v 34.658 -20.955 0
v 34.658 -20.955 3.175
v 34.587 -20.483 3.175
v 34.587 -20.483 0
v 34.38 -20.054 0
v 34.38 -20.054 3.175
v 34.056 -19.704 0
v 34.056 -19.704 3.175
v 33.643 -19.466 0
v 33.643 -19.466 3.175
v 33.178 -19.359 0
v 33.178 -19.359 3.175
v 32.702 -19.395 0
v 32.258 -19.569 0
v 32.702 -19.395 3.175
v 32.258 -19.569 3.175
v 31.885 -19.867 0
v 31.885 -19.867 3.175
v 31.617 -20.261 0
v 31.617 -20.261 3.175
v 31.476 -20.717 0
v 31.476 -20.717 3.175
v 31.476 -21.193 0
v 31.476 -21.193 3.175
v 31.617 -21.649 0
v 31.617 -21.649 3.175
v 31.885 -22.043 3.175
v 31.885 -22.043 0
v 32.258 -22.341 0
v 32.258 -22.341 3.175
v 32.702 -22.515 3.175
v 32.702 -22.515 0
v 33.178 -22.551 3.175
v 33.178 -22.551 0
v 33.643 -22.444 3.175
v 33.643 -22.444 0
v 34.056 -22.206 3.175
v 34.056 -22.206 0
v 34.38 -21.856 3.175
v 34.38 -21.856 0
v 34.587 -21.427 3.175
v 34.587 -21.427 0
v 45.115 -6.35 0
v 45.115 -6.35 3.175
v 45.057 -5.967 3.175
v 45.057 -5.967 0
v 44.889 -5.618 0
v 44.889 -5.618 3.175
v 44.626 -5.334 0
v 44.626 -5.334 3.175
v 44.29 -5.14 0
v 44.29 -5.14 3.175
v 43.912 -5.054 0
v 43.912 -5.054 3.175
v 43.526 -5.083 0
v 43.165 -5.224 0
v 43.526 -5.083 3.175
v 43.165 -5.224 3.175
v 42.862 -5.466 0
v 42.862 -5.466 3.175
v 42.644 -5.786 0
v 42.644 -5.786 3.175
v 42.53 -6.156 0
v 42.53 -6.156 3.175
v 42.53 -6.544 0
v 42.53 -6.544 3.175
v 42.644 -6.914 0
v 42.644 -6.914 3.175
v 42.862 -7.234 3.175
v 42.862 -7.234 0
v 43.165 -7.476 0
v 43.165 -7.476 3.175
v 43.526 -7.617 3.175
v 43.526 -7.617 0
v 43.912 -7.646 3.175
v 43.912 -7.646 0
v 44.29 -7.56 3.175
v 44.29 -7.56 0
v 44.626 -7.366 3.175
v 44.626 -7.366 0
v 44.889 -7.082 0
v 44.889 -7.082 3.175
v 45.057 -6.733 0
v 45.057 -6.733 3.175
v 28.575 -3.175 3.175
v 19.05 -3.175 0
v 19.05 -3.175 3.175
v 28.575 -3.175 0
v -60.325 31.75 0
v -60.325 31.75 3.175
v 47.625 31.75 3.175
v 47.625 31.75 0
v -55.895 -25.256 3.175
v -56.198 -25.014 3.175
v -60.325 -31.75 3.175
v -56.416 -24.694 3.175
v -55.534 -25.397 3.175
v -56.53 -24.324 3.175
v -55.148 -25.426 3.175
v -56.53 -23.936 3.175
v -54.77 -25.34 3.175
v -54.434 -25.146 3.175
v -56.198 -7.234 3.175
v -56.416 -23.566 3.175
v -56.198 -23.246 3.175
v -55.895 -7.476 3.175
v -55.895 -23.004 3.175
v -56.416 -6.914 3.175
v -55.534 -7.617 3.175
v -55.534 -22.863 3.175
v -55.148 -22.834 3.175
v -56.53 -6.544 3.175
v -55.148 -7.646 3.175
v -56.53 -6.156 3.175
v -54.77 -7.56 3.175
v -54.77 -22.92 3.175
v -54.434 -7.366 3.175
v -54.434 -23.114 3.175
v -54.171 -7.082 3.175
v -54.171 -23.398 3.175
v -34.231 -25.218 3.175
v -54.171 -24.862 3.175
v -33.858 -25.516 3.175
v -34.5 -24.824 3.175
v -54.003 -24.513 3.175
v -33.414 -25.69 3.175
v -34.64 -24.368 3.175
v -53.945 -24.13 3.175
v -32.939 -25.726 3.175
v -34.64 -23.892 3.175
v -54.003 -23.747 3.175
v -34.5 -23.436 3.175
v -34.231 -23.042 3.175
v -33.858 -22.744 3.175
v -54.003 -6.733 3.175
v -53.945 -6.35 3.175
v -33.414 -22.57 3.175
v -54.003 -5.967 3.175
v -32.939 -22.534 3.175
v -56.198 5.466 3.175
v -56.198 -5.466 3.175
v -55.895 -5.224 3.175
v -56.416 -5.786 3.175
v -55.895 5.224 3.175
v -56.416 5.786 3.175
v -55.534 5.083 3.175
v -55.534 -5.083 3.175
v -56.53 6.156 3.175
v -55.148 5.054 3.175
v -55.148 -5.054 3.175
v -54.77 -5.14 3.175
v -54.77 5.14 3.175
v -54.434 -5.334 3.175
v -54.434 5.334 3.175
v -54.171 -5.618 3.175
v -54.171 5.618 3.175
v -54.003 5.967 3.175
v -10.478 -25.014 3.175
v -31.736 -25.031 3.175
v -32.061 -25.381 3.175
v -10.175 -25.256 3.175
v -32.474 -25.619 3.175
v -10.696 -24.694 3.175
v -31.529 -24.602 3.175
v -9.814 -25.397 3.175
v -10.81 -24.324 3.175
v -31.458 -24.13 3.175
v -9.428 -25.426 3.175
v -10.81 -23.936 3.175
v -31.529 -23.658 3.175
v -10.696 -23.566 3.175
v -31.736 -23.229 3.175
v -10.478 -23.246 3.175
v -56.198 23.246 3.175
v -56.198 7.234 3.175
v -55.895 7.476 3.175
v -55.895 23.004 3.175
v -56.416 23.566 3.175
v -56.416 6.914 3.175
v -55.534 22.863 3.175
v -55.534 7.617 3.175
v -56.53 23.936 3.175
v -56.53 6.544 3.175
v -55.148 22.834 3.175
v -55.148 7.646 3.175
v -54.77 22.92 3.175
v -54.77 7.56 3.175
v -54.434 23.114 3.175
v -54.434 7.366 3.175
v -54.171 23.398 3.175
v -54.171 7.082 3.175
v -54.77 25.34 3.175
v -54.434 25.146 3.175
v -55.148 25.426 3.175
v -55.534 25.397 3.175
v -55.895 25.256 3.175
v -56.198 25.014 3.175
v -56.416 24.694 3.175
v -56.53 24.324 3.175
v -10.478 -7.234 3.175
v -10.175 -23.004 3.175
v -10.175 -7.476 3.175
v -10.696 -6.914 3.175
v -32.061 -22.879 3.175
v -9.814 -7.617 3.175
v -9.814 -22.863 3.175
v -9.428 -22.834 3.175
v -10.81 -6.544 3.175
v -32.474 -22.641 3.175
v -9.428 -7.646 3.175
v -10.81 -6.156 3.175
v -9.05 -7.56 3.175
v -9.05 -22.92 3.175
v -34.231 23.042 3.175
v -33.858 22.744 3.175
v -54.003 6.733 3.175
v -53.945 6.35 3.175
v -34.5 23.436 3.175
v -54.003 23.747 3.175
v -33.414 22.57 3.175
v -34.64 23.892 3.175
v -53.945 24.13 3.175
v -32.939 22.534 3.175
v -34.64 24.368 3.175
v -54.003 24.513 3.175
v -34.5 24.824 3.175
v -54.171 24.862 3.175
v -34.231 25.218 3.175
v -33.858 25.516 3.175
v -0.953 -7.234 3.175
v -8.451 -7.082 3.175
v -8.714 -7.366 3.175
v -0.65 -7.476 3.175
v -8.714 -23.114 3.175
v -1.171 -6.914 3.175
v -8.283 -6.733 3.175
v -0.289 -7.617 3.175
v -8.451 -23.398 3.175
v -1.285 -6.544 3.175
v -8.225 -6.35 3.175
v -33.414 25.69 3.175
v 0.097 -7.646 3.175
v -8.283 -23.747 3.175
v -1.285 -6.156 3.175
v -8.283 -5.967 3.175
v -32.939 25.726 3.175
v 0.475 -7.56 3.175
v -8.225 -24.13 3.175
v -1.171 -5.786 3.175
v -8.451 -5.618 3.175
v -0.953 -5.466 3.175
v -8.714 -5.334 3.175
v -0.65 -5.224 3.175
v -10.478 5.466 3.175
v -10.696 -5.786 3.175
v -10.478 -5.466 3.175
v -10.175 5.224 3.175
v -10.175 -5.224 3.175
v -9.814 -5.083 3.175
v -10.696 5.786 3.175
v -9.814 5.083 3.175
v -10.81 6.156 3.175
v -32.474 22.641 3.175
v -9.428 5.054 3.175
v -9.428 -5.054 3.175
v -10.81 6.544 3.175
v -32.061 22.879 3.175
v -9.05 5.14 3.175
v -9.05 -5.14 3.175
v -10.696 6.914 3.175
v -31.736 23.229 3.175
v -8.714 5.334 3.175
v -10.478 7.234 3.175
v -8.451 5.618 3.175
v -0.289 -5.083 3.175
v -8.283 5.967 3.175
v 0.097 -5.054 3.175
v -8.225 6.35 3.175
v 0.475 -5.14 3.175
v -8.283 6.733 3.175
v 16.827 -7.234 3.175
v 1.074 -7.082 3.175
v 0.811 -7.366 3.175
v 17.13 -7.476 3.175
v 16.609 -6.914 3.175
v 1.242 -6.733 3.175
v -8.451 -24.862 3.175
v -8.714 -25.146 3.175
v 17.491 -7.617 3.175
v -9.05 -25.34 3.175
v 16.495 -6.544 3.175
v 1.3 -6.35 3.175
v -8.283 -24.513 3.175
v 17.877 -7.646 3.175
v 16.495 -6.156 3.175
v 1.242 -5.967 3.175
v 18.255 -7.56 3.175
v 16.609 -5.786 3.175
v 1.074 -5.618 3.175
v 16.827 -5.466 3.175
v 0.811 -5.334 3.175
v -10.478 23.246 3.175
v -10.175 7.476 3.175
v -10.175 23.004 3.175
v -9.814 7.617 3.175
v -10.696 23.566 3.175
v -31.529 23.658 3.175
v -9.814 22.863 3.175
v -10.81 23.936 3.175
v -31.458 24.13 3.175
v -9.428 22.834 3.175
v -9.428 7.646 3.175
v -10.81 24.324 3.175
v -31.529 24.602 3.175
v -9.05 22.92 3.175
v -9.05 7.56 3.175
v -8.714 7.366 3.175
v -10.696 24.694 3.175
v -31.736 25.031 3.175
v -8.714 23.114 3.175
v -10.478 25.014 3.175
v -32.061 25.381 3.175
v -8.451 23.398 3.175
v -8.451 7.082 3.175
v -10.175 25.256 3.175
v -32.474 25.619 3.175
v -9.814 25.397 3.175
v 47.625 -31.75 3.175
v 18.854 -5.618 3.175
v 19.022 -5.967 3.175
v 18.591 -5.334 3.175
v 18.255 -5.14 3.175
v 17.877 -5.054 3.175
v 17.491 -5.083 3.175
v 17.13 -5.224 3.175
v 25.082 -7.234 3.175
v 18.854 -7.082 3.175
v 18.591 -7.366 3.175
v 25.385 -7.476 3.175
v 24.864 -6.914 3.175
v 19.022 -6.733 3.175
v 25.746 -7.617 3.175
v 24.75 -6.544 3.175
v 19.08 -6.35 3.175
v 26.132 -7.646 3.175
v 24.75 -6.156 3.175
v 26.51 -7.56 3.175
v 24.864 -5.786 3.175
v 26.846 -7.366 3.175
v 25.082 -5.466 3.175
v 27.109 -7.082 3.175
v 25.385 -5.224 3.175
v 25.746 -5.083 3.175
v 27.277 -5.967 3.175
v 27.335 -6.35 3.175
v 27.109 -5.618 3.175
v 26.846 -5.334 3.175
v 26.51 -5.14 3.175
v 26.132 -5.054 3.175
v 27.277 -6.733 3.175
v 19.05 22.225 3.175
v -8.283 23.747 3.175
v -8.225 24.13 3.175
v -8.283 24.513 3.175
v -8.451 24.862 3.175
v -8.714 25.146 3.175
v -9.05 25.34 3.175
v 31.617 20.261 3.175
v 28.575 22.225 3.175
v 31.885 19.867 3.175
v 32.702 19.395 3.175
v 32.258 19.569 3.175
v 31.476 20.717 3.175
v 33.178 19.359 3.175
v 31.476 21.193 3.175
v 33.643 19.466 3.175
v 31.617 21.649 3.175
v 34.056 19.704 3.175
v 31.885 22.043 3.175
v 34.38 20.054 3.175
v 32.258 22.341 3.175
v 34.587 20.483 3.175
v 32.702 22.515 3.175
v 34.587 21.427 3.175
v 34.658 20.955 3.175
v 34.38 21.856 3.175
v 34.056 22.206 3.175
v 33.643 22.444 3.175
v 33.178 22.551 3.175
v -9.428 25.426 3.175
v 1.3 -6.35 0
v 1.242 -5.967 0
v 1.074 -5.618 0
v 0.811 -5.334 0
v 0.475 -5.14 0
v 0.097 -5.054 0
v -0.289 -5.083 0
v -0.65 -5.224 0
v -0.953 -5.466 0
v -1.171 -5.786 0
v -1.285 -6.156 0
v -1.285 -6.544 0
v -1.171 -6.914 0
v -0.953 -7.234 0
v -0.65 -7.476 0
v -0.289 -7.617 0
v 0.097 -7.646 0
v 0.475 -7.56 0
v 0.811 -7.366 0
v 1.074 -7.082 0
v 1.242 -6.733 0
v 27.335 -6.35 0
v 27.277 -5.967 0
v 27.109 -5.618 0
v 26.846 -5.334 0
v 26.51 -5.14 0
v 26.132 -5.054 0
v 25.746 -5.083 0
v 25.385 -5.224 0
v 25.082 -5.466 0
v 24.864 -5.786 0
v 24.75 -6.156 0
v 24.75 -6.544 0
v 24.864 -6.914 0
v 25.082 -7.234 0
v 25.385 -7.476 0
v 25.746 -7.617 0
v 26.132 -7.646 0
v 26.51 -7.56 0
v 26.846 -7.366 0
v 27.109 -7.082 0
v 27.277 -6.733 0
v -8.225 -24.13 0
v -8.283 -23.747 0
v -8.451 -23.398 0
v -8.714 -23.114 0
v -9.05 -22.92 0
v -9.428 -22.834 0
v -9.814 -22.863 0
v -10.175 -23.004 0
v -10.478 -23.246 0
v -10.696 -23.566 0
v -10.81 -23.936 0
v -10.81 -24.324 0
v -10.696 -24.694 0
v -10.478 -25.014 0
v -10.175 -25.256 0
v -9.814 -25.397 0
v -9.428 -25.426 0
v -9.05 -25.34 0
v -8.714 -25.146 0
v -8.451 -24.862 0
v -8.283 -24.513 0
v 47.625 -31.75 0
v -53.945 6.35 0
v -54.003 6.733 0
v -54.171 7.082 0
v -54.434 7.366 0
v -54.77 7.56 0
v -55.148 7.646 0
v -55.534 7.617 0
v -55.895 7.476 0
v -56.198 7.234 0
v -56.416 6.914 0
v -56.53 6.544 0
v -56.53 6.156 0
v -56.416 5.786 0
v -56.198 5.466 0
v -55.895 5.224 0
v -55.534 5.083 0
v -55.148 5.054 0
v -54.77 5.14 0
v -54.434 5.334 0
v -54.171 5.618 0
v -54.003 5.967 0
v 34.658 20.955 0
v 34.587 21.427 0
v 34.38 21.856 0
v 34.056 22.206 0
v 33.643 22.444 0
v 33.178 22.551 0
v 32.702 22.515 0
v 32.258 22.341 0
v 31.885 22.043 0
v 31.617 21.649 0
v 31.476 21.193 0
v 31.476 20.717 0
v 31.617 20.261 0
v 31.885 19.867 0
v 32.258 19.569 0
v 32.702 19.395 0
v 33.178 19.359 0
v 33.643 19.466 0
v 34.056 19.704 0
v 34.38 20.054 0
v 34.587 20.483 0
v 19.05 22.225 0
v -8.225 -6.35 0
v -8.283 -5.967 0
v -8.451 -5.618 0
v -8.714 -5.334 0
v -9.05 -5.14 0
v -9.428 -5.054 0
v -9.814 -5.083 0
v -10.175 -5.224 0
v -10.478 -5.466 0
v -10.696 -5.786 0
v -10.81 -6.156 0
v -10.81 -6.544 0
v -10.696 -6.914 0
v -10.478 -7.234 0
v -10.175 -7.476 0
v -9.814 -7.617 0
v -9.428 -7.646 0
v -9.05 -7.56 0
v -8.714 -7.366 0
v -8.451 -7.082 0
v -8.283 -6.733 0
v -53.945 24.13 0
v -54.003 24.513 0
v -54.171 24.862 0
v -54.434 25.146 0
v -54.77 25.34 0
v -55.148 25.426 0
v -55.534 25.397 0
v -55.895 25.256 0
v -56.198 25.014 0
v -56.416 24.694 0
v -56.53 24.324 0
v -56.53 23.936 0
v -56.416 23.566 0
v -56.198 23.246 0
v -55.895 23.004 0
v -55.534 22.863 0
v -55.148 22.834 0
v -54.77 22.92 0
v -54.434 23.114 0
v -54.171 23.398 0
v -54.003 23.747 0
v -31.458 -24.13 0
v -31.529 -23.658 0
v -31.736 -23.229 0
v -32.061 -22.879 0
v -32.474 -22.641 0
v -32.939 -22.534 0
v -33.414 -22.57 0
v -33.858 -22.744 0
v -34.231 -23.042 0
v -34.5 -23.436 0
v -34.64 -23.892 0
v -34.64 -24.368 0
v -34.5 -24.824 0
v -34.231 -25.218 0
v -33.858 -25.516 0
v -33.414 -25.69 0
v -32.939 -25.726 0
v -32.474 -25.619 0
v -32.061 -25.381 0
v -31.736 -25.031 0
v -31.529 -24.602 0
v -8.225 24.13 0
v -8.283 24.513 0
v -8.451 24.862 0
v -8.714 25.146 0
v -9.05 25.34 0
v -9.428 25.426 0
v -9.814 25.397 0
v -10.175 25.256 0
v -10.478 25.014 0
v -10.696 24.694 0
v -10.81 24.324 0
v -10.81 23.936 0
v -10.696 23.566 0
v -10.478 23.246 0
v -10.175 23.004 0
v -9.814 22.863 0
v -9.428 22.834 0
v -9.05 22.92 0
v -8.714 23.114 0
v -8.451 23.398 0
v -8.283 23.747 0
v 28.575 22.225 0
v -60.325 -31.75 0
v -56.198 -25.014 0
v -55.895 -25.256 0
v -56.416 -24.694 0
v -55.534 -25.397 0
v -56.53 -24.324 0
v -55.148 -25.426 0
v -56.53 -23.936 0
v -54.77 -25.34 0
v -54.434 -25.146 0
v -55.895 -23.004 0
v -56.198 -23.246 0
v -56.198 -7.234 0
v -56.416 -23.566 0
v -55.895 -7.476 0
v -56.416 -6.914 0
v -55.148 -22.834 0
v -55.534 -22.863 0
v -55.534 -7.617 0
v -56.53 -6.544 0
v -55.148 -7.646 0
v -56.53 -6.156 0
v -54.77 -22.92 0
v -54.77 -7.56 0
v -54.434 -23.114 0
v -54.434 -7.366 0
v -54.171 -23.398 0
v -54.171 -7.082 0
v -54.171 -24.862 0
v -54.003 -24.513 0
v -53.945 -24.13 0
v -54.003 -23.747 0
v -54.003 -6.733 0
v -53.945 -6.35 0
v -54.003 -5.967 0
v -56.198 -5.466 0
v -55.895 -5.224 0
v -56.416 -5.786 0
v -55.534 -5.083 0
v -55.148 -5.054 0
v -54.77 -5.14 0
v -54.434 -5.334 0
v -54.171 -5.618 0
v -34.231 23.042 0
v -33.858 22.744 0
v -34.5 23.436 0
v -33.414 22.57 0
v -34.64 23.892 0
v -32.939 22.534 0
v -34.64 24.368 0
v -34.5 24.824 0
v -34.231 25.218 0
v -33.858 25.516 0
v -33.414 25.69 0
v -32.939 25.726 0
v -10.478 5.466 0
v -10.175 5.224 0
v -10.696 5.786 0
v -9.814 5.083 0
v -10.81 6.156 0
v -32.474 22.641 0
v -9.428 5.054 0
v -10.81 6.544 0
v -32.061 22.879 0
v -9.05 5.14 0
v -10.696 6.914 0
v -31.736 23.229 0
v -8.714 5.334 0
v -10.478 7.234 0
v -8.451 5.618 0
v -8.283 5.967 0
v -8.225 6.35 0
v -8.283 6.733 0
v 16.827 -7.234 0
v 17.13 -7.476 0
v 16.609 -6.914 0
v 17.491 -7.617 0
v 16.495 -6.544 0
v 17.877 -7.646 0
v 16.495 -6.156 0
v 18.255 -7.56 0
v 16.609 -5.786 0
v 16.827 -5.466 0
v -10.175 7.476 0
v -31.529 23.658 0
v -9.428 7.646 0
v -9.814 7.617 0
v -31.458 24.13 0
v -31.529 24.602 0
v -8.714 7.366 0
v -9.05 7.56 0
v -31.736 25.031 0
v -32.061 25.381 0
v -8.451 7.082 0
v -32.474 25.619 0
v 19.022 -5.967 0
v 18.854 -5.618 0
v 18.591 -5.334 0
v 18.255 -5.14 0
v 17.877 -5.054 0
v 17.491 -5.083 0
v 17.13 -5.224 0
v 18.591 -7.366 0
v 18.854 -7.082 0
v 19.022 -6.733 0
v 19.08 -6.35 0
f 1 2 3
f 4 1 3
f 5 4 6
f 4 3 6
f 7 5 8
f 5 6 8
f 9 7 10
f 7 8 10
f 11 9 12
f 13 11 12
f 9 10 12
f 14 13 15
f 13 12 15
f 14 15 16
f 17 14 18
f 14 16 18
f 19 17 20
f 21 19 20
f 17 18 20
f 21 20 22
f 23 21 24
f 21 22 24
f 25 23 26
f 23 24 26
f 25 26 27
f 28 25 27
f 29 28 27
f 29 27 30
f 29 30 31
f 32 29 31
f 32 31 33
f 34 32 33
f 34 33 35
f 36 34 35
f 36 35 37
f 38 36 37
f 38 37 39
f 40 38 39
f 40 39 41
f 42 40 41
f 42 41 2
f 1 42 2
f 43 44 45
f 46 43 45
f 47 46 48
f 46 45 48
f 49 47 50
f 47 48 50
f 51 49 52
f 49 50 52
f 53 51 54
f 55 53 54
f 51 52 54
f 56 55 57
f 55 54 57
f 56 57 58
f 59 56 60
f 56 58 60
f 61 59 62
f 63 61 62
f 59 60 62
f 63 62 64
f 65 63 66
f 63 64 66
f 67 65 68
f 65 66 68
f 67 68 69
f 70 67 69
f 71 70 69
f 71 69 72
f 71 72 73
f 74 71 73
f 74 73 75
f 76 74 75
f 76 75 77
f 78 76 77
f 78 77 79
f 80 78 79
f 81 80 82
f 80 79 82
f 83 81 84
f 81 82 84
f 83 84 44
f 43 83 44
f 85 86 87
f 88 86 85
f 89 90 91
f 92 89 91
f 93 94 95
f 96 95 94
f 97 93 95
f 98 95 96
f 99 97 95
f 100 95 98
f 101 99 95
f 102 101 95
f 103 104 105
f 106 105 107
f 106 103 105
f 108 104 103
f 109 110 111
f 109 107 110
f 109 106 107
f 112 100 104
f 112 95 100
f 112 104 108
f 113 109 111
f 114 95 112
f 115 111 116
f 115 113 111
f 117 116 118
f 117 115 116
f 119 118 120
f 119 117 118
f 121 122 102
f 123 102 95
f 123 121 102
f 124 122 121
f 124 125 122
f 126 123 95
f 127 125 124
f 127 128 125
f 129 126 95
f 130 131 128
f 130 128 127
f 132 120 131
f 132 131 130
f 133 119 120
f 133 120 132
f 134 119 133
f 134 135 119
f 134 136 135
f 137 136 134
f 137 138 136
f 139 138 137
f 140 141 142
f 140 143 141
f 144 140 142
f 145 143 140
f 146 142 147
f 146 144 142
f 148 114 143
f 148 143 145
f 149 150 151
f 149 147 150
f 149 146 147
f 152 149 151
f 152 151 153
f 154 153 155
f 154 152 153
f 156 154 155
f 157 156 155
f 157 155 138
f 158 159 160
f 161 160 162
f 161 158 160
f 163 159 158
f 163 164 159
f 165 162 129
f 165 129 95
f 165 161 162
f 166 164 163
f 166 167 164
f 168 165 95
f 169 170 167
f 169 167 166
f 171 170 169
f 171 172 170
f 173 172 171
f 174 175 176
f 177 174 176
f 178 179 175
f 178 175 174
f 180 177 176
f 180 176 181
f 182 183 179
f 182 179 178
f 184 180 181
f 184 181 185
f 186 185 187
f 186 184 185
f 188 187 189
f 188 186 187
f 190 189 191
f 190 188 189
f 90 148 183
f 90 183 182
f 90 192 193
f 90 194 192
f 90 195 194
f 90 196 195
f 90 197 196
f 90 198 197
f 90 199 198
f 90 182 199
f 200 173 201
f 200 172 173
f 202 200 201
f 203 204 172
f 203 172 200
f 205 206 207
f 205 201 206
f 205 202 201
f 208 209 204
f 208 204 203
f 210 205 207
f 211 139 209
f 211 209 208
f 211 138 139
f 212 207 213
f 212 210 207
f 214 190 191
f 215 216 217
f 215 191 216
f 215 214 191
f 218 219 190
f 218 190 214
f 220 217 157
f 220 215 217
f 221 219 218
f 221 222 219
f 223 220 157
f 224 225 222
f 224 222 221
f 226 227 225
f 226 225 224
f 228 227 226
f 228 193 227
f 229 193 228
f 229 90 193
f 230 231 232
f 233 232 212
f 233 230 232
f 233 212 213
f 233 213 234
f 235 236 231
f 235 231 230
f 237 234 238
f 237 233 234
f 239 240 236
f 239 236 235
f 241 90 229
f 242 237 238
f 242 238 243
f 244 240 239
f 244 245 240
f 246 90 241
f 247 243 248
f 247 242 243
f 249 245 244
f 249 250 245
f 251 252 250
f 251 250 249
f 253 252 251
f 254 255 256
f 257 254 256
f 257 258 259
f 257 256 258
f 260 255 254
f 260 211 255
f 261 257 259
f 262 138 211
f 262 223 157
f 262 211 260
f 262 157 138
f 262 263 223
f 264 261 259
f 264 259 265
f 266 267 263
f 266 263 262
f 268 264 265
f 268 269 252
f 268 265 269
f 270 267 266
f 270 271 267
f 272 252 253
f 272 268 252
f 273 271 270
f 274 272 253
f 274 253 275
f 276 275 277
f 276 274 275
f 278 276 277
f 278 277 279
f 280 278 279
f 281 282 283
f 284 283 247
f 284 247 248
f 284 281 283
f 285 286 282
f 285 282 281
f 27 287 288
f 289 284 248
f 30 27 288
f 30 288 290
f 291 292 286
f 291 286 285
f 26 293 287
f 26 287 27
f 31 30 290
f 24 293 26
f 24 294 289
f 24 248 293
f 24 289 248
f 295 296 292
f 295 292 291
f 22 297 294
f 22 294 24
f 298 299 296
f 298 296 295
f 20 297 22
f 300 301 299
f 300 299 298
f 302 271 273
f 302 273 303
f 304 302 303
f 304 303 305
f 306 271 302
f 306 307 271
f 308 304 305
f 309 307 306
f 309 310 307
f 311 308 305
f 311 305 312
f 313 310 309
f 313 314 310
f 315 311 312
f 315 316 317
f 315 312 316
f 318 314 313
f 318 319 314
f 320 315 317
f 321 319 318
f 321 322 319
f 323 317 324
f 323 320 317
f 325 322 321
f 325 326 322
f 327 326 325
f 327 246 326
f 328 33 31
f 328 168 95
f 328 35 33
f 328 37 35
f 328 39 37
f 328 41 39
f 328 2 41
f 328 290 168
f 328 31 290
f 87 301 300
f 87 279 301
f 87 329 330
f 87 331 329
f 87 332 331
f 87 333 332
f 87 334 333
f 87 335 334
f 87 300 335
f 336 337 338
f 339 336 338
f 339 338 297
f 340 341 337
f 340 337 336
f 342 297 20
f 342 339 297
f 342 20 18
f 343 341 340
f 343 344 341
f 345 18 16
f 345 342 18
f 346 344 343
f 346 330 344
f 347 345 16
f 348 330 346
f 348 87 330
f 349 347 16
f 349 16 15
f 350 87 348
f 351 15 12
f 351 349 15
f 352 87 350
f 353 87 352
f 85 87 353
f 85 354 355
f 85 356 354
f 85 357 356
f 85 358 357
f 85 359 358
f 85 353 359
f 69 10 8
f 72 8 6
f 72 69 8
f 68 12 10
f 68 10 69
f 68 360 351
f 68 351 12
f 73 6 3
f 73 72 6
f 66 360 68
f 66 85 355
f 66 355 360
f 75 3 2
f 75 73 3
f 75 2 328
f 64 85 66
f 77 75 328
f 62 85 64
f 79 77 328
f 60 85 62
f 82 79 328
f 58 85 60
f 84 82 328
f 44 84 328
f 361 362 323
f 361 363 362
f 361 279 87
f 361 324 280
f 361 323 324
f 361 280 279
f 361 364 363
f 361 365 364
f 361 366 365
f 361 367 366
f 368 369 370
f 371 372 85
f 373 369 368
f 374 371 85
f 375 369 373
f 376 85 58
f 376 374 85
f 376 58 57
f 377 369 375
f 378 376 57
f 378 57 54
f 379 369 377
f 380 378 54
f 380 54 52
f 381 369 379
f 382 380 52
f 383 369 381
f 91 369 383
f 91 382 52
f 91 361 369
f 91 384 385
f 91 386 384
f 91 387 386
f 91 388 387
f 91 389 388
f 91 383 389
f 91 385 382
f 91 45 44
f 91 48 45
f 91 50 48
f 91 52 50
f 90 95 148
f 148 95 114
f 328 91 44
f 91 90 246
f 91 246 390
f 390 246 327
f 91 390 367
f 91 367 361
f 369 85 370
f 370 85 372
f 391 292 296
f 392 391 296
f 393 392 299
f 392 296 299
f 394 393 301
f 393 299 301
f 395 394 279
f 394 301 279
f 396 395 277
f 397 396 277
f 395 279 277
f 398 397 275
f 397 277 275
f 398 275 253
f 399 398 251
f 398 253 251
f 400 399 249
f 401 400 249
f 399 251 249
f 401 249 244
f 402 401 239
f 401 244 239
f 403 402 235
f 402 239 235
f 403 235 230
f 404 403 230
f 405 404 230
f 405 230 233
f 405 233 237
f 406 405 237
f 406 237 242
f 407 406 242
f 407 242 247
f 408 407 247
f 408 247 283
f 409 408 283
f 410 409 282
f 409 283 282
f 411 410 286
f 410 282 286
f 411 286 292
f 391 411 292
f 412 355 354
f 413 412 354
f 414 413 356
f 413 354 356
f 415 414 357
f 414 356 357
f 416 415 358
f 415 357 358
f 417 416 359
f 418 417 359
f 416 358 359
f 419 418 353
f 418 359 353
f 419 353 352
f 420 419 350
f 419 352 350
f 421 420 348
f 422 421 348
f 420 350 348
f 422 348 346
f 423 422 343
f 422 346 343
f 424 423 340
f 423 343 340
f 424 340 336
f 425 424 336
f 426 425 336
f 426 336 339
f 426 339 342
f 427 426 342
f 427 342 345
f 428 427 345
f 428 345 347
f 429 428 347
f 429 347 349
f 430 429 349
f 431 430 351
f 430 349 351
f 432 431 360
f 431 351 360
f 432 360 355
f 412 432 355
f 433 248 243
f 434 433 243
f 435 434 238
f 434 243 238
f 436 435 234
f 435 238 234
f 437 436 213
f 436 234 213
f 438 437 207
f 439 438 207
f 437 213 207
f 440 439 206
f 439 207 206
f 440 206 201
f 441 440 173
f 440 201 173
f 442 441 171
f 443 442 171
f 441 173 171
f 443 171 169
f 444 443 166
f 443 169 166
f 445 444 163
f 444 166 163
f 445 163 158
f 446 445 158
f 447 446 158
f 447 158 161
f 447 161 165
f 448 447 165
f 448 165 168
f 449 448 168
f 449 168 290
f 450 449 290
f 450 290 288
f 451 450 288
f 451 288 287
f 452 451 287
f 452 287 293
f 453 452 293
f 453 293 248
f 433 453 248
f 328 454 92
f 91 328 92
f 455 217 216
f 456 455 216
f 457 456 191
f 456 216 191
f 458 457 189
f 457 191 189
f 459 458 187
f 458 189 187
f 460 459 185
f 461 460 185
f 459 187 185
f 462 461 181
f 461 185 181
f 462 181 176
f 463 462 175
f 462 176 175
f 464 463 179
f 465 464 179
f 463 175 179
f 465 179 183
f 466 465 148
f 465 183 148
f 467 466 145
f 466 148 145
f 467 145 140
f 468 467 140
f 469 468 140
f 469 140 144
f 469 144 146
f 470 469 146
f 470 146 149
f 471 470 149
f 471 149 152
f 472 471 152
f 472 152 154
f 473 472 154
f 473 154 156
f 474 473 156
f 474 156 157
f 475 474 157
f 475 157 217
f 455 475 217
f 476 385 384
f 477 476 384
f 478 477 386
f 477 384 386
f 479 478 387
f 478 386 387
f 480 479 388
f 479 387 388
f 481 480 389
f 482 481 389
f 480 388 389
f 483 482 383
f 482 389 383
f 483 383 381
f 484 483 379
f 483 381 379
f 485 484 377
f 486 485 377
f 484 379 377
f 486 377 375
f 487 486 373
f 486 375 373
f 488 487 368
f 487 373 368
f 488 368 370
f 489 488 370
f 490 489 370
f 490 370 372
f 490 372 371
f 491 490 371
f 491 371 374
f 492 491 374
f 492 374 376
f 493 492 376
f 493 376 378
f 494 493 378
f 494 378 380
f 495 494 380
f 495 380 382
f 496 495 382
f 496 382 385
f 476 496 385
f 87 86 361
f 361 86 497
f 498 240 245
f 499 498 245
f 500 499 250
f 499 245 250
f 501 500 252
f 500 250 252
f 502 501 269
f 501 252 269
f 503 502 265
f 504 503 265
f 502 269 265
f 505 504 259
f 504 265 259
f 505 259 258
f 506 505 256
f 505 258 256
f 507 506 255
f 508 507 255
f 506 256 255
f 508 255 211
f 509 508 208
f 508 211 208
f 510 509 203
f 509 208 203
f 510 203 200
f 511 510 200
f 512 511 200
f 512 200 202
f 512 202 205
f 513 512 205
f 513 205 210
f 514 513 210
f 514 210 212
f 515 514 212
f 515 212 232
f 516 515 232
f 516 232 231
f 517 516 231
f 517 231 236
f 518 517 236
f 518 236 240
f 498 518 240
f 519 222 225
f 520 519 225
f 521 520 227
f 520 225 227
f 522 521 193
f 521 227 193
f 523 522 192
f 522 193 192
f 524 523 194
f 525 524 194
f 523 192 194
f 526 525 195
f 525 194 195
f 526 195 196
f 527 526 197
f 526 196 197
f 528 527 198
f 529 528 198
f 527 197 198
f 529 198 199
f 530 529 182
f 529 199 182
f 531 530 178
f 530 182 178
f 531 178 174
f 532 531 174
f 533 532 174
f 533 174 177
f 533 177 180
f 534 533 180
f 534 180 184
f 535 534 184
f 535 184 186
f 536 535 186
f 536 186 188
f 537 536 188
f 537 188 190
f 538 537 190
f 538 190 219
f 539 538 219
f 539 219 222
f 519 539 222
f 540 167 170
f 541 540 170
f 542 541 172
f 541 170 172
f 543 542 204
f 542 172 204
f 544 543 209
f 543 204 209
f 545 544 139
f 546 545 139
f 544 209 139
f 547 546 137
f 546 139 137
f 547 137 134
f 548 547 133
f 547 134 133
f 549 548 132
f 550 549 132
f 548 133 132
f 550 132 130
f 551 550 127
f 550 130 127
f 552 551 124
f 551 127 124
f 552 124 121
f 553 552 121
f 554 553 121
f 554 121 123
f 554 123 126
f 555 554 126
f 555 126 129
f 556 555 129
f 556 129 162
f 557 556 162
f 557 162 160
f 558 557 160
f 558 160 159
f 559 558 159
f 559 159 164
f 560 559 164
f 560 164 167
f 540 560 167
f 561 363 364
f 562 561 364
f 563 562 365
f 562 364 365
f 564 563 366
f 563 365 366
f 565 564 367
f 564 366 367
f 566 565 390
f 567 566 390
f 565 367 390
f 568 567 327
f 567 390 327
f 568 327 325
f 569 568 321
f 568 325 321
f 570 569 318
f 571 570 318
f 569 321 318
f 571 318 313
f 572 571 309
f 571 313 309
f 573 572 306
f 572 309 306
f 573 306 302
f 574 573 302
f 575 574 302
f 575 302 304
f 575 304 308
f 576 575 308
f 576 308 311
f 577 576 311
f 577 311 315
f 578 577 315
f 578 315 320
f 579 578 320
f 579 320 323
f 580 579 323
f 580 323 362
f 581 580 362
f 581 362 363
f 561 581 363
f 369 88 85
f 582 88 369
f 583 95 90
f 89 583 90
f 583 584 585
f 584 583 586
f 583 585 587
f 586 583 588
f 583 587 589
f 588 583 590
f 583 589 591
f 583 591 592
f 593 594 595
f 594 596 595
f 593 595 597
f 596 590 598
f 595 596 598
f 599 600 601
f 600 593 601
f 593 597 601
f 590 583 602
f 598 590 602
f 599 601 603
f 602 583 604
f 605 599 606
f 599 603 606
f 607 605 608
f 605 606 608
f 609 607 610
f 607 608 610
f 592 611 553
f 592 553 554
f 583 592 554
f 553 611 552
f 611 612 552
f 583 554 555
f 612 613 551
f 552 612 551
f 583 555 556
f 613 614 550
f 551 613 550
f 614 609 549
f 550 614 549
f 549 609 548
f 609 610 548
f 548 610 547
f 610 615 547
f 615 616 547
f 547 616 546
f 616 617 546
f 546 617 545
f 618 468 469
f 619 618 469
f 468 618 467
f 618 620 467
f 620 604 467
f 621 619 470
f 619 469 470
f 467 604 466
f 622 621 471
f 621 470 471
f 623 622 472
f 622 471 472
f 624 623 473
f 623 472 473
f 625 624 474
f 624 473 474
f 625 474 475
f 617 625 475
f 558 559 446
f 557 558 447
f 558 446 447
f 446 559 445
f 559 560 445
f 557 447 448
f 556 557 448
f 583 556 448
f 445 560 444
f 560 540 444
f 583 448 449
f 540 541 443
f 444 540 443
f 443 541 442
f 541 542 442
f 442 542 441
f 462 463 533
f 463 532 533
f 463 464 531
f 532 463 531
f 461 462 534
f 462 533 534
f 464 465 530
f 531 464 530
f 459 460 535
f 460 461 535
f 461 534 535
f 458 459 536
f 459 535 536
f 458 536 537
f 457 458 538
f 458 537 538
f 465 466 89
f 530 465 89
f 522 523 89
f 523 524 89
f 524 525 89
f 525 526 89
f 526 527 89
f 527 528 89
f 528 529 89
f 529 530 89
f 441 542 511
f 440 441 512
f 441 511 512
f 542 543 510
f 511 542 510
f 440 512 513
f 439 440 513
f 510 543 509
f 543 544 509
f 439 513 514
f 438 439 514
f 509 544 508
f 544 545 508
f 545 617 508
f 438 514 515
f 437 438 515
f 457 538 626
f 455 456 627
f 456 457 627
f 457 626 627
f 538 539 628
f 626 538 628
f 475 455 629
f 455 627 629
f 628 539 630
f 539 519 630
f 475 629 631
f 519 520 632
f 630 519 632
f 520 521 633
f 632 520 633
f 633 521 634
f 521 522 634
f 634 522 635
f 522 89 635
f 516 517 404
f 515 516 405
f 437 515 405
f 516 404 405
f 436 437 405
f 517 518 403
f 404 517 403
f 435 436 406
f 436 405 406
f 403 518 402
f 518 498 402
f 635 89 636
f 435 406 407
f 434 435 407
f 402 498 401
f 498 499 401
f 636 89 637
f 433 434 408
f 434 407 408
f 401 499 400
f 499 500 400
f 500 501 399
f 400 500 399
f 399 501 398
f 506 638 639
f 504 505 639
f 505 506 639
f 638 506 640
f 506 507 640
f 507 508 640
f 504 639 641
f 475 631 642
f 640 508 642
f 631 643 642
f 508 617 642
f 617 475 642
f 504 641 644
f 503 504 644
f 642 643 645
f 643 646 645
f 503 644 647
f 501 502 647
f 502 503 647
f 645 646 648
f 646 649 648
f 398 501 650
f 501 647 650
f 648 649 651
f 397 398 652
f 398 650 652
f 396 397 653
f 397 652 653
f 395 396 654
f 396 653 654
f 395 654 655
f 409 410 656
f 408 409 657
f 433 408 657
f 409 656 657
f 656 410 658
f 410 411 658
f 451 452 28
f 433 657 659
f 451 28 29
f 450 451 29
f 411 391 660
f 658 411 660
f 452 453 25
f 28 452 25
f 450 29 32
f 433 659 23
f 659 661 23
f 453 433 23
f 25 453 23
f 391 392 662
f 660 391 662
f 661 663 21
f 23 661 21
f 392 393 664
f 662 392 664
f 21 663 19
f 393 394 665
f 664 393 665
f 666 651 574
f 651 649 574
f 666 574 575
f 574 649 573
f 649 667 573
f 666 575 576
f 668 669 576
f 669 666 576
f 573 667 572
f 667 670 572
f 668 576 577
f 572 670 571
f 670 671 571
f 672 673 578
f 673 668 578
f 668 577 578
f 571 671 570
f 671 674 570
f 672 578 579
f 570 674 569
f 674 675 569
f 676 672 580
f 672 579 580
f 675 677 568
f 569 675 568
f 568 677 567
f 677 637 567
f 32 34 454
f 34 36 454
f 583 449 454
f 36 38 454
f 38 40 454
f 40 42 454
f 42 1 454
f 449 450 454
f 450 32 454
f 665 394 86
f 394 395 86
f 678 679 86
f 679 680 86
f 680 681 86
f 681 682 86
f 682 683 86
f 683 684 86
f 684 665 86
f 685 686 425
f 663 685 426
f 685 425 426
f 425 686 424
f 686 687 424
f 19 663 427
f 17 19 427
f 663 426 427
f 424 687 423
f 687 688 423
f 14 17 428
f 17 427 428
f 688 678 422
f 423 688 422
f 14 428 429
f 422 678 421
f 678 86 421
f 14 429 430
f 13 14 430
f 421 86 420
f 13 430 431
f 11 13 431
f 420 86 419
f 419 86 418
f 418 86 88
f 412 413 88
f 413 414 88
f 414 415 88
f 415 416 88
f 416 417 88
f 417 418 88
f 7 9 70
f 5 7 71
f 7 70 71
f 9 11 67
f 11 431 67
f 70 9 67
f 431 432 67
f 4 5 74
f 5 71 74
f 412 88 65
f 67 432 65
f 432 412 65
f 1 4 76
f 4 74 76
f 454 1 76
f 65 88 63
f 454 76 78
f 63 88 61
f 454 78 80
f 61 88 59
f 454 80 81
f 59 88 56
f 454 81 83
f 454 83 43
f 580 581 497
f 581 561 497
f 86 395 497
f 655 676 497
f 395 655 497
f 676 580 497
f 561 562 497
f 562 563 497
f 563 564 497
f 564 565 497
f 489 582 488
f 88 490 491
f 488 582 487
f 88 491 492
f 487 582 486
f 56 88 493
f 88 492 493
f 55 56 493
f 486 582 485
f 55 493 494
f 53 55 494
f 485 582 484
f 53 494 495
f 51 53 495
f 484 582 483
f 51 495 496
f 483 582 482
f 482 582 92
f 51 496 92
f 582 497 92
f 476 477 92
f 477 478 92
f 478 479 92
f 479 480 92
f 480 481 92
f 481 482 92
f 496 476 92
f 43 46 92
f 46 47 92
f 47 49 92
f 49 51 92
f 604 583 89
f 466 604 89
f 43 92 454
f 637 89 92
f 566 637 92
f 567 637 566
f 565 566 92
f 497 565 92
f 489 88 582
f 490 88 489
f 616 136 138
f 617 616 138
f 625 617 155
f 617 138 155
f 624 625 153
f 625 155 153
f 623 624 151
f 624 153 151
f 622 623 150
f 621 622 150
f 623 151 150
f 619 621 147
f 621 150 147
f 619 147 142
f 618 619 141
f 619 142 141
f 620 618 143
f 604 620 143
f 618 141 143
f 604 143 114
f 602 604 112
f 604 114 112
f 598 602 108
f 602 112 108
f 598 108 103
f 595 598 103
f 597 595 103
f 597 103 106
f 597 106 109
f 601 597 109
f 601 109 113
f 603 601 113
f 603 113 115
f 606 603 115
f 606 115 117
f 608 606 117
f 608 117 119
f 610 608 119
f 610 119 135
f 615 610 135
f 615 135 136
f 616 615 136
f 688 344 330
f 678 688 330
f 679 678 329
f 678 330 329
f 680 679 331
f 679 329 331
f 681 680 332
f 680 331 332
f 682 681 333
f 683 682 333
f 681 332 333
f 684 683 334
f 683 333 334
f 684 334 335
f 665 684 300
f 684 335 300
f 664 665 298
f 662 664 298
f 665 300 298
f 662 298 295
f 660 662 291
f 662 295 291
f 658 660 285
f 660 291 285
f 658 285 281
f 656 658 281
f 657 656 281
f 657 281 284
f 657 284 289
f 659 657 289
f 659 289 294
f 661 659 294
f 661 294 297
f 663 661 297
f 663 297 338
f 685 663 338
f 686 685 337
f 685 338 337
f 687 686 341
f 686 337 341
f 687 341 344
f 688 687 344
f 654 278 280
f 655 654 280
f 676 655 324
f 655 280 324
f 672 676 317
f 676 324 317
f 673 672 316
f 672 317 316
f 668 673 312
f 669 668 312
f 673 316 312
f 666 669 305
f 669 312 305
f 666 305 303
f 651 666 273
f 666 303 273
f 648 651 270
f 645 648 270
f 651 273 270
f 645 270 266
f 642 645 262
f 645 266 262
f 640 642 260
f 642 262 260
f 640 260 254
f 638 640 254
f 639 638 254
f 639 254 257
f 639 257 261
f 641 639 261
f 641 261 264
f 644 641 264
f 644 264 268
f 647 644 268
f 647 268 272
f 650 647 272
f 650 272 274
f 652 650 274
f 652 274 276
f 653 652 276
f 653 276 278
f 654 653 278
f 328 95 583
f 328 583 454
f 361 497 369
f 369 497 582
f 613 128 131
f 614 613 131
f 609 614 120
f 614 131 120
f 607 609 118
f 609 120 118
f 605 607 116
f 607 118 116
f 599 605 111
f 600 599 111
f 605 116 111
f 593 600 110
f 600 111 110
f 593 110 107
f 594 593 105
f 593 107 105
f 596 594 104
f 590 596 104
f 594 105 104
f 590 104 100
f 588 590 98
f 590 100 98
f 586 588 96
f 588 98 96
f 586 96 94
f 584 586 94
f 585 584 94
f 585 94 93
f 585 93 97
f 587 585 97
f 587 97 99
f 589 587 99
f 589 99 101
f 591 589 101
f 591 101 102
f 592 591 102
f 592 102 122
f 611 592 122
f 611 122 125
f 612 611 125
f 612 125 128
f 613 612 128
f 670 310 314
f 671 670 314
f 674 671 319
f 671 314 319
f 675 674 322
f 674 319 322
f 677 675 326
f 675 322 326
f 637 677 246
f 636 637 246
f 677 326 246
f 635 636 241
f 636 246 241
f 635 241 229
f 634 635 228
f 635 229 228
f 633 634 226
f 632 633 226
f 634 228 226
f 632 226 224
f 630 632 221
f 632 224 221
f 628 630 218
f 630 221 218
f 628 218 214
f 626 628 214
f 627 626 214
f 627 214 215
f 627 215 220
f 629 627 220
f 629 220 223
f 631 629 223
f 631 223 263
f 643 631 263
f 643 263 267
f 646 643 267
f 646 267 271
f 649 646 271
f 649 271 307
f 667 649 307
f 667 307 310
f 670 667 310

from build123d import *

# Parameters (mm, degrees)
SKETCH1_W               = 95.25
SKETCH1_H               = 63.5
BOSS_EXTRUDE1_DEPTH     = 3.175
SKETCH2_R               = 1.6
CUT_EXTRUDE1_DEPTH      = 58.326117521
CUT_EXTRUDE2_DEPTH      = 58.326117521
CUT_EXTRUDE2_DEPTH_BACK = 58.326117521
SKETCH3_W               = 9.525
SKETCH3_H               = 25.4
SKETCH5_W               = 12.7
SKETCH5_H               = 63.5
BOSS_EXTRUDE2_DEPTH     = 3.175
SKETCH7_R               = 1.3
CUT_EXTRUDE3_DEPTH      = 69.244038201
SKETCH8_R               = 1.29999994
CUT_EXTRUDE4_DEPTH      = 3.175


with BuildPart() as part:
    # Sketch1 → Boss-Extrude1 (new body)
    with BuildSketch(Plane.XY):
        Rectangle(SKETCH1_W, SKETCH1_H)
    extrude(amount=BOSS_EXTRUDE1_DEPTH)

    # Sketch2 → Cut-Extrude1 (cut, through all)
    with BuildSketch(Plane.XY.offset(3.175)):
        with Locations((33.0581, 20.955)):
            Circle(SKETCH2_R)
        with Locations((33.0581, -20.955)):
            Circle(SKETCH2_R)
        with Locations((-33.0581, 24.13)):
            Circle(SKETCH2_R)
        with Locations((-33.0581, -24.13)):
            Circle(SKETCH2_R)
    extrude(amount=-CUT_EXTRUDE1_DEPTH, mode=Mode.SUBTRACT)

    # Sketch3 → Cut-Extrude2 (cut, two sides: drawn at the far end of the back side and taken through both)
    with BuildSketch(Plane.XY.offset(3.175).offset(-CUT_EXTRUDE2_DEPTH_BACK)):
        with Locations((23.8125, 9.525)):
            Rectangle(SKETCH3_W, SKETCH3_H)
    extrude(amount=CUT_EXTRUDE2_DEPTH + CUT_EXTRUDE2_DEPTH_BACK, mode=Mode.SUBTRACT)

    # Sketch5 → Boss-Extrude2 (add)
    with BuildSketch(Plane.XY.offset(3.175)):
        with Locations((-53.975, 0)):
            Rectangle(SKETCH5_W, SKETCH5_H)
    extrude(amount=-BOSS_EXTRUDE2_DEPTH)

    # Sketch7 → Cut-Extrude3 (cut, through all)
    with BuildSketch(Plane.XY.offset(3.175)):
        with Locations((-55.245, 24.13)):
            Circle(SKETCH7_R)
        with Locations((-9.525, 24.13)):
            Circle(SKETCH7_R)
        with Locations((-9.525, 6.35)):
            Circle(SKETCH7_R)
        with Locations((-55.245, 6.35)):
            Circle(SKETCH7_R)
        with Locations((-55.245, -6.35)):
            Circle(SKETCH7_R)
        with Locations((-9.525, -6.35)):
            Circle(SKETCH7_R)
        with Locations((-9.525, -24.13)):
            Circle(SKETCH7_R)
        with Locations((-55.245, -24.13)):
            Circle(SKETCH7_R)
    extrude(amount=-CUT_EXTRUDE3_DEPTH, mode=Mode.SUBTRACT)

    # Sketch8 → Cut-Extrude4 (cut)
    with BuildSketch(Plane.XY.offset(3.175)):
        with Locations((0, -6.35)):
            Circle(SKETCH8_R)
        with Locations((43.815, -6.35)):
            Circle(SKETCH8_R)
        with Locations((17.78, -6.35)):
            Circle(SKETCH8_R)
        with Locations((26.035, -6.35)):
            Circle(SKETCH8_R)
    extrude(amount=-CUT_EXTRUDE4_DEPTH, mode=Mode.SUBTRACT)


solid = part.part
